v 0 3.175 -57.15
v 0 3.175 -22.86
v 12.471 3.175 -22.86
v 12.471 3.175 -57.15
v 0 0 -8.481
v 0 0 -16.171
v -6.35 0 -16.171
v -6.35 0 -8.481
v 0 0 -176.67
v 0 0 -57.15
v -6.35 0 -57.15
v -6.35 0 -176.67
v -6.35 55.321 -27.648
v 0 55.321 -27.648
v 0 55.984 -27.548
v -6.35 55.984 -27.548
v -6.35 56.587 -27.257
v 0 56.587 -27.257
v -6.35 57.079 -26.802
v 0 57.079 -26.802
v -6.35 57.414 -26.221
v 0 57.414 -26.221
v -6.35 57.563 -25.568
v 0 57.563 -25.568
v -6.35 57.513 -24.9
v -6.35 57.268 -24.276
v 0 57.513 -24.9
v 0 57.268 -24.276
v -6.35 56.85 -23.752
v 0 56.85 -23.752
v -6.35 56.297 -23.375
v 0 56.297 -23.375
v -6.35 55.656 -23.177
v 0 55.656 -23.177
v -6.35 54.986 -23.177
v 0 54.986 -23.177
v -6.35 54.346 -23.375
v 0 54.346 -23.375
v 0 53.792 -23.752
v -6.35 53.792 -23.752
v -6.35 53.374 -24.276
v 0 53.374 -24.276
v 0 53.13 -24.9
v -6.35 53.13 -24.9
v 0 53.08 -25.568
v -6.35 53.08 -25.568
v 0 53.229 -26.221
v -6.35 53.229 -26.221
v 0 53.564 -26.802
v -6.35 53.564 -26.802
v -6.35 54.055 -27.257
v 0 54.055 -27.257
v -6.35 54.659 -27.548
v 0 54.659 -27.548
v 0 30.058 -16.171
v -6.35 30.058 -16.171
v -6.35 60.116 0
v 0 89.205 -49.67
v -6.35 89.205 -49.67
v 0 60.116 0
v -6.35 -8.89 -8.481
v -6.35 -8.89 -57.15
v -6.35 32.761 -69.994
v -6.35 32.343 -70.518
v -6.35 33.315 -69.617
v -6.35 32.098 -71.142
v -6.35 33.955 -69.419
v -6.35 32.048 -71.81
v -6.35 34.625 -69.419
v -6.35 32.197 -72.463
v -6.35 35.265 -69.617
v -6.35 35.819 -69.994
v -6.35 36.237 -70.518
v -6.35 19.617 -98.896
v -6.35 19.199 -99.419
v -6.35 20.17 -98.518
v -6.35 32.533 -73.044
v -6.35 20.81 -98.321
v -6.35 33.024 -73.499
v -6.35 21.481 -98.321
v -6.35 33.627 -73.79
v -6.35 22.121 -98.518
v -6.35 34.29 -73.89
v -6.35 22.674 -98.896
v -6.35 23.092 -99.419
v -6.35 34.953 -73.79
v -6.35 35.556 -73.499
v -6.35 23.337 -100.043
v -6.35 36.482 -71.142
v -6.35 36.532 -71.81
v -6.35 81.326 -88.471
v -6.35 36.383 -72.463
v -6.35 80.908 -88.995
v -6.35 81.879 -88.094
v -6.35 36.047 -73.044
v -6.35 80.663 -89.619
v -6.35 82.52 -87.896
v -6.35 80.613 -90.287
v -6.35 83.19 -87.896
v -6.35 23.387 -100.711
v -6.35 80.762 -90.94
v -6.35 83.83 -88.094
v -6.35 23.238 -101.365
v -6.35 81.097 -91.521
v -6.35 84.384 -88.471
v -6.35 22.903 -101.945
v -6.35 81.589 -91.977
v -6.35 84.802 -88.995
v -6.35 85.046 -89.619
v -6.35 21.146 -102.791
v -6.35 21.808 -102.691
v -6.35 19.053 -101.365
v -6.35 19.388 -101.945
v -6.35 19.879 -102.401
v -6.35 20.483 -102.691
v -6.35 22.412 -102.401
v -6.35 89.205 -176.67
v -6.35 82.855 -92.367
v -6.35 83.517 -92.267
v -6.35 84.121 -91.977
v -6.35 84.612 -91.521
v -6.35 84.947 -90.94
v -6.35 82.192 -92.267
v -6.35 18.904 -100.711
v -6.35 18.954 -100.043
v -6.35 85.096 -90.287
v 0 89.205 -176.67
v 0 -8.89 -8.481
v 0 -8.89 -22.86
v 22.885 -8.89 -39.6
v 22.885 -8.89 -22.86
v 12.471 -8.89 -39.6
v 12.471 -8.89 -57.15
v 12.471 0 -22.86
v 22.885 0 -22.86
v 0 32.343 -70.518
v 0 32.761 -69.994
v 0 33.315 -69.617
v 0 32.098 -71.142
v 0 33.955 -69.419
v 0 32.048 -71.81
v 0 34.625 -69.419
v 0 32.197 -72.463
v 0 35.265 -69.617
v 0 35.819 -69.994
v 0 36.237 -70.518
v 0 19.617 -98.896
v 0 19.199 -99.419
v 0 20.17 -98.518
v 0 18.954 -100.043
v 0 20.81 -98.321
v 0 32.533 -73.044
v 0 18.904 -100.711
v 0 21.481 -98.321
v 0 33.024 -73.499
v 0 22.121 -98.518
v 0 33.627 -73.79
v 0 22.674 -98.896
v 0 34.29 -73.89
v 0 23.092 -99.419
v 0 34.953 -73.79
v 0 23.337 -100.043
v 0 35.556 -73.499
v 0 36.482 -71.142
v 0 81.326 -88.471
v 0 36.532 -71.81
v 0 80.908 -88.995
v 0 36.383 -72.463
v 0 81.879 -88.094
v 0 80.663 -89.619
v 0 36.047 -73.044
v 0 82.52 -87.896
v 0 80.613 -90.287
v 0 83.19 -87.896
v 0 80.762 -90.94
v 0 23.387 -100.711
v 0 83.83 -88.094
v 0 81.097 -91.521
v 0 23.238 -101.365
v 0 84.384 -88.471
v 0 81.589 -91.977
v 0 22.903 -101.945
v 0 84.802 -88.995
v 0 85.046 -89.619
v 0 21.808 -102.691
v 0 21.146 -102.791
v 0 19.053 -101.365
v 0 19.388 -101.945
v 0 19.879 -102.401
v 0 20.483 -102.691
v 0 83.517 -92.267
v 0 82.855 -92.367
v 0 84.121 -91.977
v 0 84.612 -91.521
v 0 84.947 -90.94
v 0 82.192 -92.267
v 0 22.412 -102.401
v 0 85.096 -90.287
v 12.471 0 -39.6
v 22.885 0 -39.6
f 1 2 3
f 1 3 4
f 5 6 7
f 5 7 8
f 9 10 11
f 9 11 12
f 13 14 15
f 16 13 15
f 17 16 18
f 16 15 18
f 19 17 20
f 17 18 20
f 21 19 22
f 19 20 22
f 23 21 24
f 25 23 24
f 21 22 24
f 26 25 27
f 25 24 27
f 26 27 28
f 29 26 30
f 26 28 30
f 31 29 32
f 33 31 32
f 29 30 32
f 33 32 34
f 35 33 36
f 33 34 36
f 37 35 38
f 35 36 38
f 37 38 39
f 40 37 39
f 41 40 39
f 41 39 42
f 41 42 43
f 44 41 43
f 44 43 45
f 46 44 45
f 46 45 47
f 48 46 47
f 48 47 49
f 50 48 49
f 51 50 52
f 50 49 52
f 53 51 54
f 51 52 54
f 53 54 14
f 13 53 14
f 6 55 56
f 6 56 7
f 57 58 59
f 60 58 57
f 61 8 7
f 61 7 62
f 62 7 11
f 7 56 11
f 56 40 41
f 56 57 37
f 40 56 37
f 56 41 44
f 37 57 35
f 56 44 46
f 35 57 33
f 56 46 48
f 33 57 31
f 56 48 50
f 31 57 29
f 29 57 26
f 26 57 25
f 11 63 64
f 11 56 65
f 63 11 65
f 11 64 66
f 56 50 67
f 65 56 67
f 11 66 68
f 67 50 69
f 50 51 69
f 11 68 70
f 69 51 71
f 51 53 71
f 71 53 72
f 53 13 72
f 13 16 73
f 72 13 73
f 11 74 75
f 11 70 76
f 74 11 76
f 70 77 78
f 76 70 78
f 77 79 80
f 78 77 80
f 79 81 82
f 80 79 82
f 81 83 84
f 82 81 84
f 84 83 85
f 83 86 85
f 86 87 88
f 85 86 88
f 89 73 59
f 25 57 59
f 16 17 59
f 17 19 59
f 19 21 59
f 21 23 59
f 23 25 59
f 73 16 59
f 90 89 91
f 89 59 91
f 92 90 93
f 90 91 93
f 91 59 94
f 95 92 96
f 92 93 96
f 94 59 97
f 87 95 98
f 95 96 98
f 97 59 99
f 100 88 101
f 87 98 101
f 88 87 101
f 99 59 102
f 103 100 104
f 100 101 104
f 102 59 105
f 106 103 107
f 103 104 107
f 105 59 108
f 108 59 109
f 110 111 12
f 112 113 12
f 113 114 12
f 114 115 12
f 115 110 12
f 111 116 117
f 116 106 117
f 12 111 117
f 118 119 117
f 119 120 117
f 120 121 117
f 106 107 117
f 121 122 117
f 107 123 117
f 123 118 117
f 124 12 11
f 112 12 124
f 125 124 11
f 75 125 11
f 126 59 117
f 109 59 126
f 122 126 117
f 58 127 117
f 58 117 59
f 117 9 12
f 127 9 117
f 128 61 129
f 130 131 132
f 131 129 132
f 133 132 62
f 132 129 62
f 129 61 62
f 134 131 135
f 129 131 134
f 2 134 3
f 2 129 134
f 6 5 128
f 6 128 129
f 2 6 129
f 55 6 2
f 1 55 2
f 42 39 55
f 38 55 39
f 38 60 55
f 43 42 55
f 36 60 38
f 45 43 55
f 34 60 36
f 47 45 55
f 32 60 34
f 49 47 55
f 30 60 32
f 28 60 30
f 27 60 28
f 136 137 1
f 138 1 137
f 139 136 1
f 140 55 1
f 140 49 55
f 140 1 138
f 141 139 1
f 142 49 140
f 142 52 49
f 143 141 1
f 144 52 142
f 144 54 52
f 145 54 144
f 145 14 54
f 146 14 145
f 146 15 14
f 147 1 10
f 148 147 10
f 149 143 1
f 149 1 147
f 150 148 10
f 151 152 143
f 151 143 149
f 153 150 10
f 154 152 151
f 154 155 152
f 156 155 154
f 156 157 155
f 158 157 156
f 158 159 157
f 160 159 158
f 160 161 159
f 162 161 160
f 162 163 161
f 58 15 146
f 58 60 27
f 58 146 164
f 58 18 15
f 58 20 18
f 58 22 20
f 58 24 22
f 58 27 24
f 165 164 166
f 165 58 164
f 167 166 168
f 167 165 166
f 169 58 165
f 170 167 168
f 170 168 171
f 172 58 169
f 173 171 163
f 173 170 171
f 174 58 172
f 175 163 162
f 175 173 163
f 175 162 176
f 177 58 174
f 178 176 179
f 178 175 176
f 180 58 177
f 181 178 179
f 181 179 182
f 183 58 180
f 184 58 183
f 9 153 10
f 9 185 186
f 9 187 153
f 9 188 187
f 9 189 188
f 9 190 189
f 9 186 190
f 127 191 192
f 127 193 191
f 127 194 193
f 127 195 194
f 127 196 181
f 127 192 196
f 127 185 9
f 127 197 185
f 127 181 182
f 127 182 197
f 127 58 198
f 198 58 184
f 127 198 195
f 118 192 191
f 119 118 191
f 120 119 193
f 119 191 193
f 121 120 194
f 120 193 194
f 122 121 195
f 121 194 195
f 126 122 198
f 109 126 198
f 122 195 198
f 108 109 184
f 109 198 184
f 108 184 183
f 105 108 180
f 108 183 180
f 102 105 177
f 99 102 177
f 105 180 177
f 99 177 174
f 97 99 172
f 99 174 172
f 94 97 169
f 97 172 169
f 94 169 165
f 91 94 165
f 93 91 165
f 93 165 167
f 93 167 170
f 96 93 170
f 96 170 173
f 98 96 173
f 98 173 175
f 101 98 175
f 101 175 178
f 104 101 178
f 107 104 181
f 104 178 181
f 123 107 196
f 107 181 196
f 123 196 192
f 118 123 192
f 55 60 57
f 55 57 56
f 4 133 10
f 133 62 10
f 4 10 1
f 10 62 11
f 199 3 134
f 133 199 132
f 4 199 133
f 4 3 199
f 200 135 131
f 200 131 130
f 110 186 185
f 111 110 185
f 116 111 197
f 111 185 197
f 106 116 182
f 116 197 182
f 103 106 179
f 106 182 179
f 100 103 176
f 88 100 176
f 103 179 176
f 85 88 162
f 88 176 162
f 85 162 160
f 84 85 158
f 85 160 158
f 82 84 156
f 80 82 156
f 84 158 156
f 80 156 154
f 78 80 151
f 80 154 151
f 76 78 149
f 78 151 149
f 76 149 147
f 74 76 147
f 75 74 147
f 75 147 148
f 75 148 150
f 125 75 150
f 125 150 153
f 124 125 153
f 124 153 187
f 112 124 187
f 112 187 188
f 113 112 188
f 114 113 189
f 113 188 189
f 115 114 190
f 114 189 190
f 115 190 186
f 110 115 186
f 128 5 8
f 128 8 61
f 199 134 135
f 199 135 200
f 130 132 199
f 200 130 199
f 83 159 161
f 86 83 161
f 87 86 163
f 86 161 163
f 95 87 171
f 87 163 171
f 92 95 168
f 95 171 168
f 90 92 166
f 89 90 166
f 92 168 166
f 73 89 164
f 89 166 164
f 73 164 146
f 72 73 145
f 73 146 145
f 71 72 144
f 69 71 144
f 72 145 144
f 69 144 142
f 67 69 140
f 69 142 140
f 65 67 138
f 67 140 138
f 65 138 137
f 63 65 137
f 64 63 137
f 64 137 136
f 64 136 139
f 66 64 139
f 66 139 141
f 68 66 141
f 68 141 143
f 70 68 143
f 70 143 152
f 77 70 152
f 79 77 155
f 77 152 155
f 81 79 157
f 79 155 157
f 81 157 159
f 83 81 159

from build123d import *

# Parameters (mm, degrees)
SKETCH2_R           = 2.2479
BOSS_EXTRUDE3_DEPTH = 6.35
SKETCH2_5_W         = 34.29
SKETCH2_5_H         = 12.065
BOSS_EXTRUDE4_DEPTH = 12.4714
SKETCH3_W           = 16.74
SKETCH3_H           = 8.89
BOSS_EXTRUDE5_DEPTH = 10.414


with BuildPart() as part:
    # Sketch2 → Boss-Extrude3 (new body)
    with BuildSketch(Plane(origin=(0, 0, 0), x_dir=(0, 0, -1), z_dir=(1, 0, 0))):
        Polygon((16.17094154, 0), (8.480621378, 0), (8.480621378, -8.89), (57.15, -8.89), (57.15, 0), (176.670010733, 0), (176.670010733, 89.2048), (49.670010733, 89.2048), (0, 60.116195388), (16.17094154, 30.058097694), align=None)
        with Locations((90.119204984, 82.8548)):
            Circle(SKETCH2_R, mode=Mode.SUBTRACT)
        with Locations((71.642065552, 34.29)):
            Circle(SKETCH2_R, mode=Mode.SUBTRACT)
        with Locations((100.543356523, 21.1455)):
            Circle(SKETCH2_R, mode=Mode.SUBTRACT)
        with Locations((25.4, 55.3212)):
            Circle(SKETCH2_R, mode=Mode.SUBTRACT)
    extrude(amount=-BOSS_EXTRUDE3_DEPTH)

    # Sketch2<5> → Boss-Extrude4 (add)
    with BuildSketch(Plane(origin=(0, 0, 0), x_dir=(0, 0, -1), z_dir=(1, 0, 0))):
        with Locations((40.005, -2.8575)):
            Rectangle(SKETCH2_5_W, SKETCH2_5_H)
    extrude(amount=BOSS_EXTRUDE4_DEPTH)

    # Sketch3 → Boss-Extrude5 (add)
    with BuildSketch(Plane(origin=(12.4714, 0, 0), x_dir=(0, 0, -1), z_dir=(1, 0, 0))):
        with Locations((31.23, -4.445)):
            Rectangle(SKETCH3_W, SKETCH3_H)
    extrude(amount=BOSS_EXTRUDE5_DEPTH)


solid = part.part
